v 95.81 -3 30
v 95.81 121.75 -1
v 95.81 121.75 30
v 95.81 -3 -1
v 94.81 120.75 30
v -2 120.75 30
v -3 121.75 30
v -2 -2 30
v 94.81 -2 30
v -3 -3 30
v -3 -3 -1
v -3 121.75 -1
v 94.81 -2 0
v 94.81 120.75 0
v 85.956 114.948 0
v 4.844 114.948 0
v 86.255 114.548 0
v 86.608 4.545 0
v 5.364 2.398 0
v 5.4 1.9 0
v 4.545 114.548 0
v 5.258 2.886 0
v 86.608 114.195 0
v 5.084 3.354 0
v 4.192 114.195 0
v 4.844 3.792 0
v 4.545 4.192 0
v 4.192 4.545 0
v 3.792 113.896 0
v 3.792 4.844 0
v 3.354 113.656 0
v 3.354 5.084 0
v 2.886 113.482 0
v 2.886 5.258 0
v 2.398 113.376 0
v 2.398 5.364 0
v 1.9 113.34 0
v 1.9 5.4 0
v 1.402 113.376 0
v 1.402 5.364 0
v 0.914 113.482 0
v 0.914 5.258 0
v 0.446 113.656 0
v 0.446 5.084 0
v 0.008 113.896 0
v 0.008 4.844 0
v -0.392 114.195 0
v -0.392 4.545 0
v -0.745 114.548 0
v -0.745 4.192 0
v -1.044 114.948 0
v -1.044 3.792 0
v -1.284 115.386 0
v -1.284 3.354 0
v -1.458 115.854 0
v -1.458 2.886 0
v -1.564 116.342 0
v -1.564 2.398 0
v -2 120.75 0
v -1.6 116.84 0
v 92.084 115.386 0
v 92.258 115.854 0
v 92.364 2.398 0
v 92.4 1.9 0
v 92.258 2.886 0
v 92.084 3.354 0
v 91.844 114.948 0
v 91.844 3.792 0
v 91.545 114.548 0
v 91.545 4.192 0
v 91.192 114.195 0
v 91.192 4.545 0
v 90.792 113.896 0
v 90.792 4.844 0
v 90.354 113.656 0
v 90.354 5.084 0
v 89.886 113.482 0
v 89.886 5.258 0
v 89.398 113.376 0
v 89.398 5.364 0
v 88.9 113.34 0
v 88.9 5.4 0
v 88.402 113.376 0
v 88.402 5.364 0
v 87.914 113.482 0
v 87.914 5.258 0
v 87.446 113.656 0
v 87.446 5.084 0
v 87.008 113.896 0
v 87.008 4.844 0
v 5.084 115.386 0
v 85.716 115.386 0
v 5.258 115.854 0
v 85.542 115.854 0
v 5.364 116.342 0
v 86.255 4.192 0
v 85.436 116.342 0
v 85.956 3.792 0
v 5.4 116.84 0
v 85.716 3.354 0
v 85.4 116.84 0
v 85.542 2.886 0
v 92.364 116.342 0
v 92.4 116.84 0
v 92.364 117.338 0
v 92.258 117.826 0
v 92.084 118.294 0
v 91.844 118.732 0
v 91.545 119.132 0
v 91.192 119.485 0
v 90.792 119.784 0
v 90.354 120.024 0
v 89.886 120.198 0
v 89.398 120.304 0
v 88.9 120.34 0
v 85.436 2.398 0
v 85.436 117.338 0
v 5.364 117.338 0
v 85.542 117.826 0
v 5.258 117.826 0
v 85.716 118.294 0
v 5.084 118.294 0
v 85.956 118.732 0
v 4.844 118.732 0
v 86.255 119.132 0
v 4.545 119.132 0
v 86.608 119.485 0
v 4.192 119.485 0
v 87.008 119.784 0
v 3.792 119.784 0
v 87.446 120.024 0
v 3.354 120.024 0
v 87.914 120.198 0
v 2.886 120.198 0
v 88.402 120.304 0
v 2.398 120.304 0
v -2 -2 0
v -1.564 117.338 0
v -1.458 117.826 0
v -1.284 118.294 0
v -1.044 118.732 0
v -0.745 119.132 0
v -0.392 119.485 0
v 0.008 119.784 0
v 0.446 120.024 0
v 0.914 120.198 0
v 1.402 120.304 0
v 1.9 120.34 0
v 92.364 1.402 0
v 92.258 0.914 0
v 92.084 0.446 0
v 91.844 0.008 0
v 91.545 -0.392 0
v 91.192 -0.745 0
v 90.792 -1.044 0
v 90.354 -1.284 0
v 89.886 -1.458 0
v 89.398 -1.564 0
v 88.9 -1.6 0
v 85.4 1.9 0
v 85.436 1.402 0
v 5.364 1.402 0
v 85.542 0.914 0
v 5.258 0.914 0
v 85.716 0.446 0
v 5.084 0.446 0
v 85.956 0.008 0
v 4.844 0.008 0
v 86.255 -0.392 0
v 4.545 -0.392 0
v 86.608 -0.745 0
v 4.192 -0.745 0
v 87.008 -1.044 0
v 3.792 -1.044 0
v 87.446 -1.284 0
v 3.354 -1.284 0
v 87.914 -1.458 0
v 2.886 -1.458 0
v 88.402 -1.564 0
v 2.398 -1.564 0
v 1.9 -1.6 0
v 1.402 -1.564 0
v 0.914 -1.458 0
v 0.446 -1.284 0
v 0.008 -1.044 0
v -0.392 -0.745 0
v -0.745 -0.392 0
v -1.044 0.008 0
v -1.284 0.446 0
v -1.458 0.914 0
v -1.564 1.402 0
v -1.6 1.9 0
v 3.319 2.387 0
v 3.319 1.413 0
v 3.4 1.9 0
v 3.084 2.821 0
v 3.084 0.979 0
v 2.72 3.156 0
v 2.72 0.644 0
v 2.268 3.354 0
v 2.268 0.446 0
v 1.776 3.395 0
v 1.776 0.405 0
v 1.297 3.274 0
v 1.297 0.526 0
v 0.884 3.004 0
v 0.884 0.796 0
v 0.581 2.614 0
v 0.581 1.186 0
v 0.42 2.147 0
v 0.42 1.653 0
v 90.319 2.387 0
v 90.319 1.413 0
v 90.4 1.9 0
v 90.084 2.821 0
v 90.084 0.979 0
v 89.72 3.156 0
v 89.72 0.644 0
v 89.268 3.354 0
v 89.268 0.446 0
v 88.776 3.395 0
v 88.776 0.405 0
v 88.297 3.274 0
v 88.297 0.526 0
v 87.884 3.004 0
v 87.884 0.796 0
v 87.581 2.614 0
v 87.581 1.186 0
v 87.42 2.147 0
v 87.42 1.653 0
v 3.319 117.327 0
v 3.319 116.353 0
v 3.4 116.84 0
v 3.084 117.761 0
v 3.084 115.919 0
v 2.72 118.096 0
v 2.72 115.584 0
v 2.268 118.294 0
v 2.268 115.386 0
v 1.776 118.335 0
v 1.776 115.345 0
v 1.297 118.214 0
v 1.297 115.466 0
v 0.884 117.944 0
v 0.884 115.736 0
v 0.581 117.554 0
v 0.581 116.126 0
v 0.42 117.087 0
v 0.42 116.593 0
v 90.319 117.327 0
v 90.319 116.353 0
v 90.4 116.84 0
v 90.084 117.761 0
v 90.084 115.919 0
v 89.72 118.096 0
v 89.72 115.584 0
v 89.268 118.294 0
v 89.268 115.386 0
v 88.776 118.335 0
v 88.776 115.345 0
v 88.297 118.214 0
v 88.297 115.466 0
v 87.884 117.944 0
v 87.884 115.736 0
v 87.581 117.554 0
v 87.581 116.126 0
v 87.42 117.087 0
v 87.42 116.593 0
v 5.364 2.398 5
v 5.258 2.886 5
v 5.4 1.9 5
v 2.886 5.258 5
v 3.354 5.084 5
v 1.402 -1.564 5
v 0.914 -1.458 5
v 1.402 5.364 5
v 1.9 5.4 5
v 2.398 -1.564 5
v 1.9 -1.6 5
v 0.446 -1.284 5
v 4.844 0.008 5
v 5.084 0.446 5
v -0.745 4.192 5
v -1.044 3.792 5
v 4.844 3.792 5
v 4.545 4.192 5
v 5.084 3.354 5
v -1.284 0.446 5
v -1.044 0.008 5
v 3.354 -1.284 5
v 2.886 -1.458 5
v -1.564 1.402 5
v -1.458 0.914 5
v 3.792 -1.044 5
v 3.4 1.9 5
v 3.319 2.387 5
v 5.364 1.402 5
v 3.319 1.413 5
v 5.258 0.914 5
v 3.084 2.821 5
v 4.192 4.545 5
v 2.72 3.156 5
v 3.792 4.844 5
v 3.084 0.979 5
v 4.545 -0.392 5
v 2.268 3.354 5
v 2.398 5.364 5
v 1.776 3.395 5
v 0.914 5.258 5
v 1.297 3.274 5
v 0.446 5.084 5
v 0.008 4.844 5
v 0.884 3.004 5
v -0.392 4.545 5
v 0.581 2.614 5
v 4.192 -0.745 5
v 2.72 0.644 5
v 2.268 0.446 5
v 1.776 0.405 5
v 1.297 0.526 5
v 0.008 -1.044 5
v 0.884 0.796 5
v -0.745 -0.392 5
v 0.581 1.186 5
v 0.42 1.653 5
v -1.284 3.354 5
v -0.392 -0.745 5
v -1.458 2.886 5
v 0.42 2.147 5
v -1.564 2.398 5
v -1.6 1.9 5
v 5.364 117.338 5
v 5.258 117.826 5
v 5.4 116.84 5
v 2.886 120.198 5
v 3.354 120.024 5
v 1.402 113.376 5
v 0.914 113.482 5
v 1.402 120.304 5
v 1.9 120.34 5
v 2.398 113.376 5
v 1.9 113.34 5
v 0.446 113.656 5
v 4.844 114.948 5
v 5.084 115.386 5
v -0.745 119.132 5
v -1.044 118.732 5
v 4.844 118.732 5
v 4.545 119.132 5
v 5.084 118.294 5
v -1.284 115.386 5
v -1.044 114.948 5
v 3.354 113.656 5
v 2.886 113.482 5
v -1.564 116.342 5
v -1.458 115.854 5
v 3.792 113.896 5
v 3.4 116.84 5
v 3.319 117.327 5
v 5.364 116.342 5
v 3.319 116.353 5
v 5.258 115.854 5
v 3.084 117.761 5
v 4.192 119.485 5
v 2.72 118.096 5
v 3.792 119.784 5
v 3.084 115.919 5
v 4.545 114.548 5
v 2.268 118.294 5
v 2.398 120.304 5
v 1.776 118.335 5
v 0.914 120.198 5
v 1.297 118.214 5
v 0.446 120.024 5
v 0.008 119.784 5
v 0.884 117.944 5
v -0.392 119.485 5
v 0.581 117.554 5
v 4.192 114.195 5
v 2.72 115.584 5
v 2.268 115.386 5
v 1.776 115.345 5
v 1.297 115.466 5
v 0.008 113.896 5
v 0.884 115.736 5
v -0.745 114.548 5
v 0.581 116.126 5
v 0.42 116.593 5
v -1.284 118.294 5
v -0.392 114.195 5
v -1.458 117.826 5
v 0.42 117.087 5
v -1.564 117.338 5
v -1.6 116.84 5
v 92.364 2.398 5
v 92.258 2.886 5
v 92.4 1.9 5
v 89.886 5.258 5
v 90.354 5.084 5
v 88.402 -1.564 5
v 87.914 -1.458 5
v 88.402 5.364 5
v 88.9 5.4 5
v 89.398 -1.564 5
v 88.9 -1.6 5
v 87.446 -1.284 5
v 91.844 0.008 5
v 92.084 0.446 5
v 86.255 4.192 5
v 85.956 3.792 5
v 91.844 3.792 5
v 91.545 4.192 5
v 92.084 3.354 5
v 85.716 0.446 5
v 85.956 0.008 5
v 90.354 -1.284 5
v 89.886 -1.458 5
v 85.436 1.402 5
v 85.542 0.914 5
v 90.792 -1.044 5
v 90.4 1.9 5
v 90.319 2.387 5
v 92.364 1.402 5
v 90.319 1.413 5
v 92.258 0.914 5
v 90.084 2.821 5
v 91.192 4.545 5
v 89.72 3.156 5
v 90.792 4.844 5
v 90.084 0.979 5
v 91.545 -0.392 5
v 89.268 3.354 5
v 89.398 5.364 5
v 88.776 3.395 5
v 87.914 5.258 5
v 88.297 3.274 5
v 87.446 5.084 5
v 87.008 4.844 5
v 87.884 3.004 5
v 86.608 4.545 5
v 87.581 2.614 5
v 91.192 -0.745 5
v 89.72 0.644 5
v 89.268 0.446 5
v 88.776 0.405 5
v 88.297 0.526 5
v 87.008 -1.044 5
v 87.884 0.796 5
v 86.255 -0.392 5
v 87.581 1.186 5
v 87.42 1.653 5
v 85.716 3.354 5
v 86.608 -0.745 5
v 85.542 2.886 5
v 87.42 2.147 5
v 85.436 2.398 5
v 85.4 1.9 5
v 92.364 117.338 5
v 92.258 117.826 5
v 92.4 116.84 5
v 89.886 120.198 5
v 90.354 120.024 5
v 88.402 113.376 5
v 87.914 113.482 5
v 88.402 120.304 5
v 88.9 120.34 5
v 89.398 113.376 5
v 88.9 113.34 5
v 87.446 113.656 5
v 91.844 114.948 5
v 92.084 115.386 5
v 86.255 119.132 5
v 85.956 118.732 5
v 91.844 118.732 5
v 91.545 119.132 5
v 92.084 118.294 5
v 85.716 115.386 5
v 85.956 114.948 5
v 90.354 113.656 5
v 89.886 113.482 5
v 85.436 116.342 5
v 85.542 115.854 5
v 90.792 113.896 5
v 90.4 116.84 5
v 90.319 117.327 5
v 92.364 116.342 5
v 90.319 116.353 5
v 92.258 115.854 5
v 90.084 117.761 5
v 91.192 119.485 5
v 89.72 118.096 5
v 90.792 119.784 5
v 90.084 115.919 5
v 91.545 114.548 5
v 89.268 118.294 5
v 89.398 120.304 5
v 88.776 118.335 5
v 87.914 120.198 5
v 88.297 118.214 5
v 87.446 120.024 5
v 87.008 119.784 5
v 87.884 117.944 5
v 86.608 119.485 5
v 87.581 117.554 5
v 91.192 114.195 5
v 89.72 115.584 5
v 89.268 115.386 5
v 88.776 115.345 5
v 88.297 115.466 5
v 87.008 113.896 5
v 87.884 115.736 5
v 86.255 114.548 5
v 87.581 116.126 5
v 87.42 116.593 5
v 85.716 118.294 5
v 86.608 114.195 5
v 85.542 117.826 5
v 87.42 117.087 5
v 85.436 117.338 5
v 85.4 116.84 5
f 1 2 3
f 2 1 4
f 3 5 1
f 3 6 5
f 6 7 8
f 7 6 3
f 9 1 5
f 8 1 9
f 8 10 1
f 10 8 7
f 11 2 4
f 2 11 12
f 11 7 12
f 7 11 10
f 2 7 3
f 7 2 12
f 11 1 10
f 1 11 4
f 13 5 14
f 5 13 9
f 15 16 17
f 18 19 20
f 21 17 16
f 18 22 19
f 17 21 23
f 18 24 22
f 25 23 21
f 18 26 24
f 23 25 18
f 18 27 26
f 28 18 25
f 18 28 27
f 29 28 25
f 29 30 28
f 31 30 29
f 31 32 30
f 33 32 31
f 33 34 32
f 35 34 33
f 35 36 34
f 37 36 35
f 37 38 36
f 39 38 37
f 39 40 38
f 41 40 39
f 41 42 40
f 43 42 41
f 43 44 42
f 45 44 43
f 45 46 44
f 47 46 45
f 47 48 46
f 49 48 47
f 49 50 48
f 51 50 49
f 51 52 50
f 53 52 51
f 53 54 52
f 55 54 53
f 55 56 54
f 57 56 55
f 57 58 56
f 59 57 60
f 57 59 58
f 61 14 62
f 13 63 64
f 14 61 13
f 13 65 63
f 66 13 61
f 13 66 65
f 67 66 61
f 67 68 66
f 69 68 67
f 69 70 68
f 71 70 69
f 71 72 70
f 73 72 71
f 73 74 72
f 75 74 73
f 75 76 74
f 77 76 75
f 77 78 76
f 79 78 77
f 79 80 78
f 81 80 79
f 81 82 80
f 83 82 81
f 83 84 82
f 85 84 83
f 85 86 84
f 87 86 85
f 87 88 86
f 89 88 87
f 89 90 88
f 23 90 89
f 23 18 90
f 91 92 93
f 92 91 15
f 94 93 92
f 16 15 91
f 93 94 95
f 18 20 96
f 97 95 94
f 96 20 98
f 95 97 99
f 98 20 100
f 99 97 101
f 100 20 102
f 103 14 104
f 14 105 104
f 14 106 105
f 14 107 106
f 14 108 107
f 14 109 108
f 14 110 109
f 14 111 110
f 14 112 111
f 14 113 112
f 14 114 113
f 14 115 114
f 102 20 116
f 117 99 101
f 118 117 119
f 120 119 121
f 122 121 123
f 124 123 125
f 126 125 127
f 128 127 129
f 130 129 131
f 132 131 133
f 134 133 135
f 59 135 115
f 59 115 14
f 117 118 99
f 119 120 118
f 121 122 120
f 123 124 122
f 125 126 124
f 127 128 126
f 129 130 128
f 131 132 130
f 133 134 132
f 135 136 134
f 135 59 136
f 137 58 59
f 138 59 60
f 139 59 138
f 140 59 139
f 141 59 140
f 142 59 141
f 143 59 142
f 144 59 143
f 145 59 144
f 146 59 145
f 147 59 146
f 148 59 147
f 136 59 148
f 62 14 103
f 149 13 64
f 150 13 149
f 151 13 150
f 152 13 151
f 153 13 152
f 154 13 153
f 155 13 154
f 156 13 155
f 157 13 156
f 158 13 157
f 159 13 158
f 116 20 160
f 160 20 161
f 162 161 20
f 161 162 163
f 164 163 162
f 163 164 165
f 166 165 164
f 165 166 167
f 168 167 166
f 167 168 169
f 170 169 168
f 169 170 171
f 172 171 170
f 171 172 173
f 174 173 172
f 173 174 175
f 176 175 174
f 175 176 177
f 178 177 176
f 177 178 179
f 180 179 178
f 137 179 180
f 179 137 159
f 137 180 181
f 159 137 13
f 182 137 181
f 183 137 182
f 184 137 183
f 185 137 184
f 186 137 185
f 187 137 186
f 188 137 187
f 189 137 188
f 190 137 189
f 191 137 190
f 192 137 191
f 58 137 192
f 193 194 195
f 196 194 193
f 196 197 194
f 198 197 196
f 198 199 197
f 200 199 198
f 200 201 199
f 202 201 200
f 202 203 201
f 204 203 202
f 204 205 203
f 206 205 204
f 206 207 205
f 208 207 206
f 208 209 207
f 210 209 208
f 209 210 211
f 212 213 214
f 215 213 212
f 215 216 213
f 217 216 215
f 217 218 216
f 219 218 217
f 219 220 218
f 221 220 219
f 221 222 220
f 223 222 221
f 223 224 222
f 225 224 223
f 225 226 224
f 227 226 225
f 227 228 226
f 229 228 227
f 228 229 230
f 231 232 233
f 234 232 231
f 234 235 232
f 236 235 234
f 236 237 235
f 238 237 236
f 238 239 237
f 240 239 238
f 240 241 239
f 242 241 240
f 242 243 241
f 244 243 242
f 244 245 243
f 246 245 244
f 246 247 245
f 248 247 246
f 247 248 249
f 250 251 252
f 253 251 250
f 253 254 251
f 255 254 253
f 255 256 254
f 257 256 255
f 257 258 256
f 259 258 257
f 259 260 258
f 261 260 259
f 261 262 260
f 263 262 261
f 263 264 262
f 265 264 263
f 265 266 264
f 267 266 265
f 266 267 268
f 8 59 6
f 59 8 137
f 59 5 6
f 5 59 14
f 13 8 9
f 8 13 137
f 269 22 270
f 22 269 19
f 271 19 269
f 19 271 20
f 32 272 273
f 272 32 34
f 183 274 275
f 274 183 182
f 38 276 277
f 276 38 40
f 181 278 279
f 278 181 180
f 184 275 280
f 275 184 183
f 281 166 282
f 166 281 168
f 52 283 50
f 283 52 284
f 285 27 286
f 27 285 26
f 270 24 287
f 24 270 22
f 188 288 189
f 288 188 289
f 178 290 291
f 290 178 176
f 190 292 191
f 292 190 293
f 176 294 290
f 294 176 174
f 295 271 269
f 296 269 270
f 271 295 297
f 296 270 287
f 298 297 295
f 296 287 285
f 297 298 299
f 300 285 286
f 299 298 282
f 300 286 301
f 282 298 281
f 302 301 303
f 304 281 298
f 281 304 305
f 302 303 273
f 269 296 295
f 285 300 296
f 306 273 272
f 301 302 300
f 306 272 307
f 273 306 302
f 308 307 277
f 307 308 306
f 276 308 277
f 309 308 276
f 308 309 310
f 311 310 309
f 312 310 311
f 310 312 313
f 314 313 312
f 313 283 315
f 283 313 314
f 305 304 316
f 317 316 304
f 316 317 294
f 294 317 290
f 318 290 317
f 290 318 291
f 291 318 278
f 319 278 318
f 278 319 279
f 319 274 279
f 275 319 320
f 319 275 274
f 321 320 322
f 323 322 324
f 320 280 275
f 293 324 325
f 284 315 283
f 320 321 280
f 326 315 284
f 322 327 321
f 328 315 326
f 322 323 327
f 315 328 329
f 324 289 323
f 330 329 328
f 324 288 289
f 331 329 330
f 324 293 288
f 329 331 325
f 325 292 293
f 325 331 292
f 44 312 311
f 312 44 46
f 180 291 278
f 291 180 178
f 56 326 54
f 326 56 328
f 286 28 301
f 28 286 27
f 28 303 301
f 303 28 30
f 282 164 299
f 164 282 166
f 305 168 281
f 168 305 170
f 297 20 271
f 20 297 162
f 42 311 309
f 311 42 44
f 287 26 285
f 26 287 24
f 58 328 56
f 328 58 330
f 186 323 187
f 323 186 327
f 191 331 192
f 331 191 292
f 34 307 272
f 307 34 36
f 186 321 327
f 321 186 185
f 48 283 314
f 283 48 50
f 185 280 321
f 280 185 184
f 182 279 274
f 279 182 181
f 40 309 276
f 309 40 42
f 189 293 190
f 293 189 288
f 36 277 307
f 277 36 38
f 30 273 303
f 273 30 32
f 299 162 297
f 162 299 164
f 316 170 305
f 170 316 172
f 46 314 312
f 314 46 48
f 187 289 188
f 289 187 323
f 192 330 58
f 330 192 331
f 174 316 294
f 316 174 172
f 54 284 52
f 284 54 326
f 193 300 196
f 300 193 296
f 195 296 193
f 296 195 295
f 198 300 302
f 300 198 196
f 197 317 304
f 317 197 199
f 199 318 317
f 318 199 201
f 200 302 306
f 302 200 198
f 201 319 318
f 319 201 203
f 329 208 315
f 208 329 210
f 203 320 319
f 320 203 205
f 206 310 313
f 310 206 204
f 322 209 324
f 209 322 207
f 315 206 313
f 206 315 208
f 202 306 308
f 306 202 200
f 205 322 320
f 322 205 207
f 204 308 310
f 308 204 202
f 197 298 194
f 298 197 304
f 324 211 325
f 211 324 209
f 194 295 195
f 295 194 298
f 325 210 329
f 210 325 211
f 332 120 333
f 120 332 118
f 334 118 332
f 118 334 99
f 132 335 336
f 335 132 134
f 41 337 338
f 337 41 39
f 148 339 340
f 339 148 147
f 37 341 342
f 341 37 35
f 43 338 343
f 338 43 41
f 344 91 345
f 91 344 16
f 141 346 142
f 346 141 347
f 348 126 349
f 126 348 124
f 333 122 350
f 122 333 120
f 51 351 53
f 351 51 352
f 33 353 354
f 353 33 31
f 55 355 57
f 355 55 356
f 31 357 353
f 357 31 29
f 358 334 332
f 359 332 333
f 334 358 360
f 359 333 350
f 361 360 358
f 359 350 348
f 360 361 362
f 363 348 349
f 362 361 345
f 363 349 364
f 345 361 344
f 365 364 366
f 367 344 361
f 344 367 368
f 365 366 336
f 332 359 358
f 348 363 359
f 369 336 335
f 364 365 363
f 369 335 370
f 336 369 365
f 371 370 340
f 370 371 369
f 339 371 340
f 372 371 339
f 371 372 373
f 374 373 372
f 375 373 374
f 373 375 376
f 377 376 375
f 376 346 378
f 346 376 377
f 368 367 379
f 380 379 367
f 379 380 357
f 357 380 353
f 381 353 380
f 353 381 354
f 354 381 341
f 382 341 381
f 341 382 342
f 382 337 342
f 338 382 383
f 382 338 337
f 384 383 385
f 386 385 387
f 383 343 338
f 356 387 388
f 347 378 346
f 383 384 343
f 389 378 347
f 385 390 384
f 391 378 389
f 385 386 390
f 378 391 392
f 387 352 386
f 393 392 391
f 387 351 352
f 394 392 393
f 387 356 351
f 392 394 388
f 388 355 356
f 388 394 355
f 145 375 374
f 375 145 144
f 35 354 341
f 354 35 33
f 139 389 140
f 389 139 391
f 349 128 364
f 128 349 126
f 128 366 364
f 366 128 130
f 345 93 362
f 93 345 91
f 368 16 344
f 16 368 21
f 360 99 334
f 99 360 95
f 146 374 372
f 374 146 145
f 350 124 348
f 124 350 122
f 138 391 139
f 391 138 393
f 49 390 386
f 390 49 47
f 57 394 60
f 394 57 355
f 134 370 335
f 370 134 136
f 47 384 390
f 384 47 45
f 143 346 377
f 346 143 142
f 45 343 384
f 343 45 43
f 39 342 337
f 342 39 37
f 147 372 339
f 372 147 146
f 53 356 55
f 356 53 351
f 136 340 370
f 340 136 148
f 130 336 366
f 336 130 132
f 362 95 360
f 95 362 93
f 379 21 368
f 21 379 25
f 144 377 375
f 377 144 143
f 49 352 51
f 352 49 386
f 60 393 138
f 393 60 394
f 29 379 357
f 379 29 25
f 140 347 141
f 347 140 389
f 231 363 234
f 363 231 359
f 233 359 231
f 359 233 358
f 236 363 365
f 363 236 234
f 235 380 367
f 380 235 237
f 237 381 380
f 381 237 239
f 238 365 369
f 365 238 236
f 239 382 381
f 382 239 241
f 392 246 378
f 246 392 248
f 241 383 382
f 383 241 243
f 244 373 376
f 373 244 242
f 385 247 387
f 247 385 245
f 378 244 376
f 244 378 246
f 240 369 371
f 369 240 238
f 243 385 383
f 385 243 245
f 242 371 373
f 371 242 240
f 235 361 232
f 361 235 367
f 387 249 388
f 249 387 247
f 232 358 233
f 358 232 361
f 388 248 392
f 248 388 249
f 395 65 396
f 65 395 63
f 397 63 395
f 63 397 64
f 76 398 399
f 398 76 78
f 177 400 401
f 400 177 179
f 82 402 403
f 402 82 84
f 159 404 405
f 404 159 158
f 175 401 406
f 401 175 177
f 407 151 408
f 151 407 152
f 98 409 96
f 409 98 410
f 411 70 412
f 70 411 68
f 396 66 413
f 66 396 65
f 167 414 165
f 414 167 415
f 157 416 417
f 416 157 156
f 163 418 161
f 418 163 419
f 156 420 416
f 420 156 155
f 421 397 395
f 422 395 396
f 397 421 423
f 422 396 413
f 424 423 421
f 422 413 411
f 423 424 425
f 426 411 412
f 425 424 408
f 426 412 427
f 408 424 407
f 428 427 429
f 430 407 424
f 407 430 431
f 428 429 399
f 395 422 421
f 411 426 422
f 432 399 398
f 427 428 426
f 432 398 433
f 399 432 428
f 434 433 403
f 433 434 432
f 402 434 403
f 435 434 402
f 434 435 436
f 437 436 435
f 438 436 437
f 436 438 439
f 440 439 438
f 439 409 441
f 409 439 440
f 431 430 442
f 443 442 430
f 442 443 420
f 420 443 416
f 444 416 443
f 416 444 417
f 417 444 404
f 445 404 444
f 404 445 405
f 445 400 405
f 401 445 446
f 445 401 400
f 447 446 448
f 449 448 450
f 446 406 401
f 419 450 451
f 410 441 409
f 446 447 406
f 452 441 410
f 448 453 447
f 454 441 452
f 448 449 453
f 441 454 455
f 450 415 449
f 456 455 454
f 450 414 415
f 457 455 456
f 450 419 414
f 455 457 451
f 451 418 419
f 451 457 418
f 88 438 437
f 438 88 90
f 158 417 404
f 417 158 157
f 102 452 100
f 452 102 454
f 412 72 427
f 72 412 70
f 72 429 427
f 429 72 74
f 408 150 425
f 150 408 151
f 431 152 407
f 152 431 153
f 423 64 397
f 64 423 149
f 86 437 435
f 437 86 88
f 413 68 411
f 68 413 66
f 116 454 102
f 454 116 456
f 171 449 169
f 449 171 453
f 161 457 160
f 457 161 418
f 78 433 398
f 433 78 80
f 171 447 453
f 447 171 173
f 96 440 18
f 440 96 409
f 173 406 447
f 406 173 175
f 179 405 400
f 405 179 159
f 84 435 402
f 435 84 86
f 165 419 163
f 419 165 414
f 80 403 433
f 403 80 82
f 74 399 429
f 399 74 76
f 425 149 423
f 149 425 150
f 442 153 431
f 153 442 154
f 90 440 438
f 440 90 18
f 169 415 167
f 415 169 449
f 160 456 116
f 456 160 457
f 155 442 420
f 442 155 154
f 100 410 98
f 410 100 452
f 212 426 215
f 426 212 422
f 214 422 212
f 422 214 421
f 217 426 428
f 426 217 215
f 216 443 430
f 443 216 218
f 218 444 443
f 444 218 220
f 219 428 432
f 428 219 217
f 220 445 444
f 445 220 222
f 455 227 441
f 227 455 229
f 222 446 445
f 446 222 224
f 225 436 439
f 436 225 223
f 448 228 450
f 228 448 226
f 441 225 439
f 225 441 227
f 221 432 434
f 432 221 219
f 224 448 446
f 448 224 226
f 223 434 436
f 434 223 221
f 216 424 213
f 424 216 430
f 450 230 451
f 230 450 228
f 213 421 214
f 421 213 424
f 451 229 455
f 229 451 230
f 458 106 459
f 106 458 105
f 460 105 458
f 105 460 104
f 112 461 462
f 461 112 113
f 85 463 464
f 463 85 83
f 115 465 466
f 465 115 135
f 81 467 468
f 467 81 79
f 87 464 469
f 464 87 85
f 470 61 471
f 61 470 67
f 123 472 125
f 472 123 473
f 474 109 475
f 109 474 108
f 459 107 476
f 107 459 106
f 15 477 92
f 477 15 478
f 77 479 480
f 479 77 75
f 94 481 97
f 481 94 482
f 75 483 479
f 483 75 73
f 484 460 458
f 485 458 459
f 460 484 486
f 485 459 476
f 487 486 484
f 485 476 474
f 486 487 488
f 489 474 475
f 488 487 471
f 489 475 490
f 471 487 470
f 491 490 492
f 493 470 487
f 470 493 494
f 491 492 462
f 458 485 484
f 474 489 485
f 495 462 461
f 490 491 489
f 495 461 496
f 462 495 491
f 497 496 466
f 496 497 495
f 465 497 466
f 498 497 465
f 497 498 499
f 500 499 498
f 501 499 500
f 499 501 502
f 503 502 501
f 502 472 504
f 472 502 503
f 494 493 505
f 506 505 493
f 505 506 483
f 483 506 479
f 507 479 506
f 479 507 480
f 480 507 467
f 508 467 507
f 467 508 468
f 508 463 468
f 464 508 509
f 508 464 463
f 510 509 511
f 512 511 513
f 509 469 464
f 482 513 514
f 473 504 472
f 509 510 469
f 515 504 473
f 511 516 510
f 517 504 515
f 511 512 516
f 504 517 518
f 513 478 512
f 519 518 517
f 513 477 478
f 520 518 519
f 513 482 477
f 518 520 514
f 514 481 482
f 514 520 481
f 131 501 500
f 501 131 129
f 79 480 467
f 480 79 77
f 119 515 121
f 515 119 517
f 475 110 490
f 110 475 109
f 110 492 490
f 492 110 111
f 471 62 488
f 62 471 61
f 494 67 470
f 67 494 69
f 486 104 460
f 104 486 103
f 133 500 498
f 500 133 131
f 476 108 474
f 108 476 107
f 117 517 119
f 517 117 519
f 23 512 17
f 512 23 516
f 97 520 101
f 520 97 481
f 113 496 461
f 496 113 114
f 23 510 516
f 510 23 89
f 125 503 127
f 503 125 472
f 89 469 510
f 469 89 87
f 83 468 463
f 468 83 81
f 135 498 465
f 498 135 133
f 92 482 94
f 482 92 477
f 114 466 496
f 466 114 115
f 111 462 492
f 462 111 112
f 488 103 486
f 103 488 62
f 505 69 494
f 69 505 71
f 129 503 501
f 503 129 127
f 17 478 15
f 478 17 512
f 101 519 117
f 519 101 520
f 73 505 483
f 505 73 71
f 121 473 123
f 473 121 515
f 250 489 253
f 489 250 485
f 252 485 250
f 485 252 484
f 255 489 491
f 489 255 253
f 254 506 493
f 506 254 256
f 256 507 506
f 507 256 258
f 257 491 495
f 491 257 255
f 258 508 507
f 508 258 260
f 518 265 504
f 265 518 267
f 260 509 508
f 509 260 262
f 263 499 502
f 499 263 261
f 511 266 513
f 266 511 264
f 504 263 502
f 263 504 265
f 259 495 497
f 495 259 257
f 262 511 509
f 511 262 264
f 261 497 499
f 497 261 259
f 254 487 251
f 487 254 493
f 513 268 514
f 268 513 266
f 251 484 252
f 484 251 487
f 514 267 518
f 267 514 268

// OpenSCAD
//currantly the box is unfinished, but you can still use faceplate.
$fa=1/1;
$fs=1/2;
bissl=1/100;
part="bottom";//[bottom,top,faceplate]
pegs_h=5;
pegs_id=3;
pegs_od=7;
wall=1;
depth=30;
air=0.5; //wiggle room
//board (and box) size goes here
//defined as corners of inner space relatove to x=y=0 point on the board
//[x1,y1,x2,y2]
board=[-2,-2,90.81+4,118.75+2];
screen=[67.2+2,16.5-10,20,27];
//holes in the front panel
//defined as [x,y,diameter], where x from KiCAD becomes y and y becomes x, because
//coordinate conventions in Kicad and OpenSCAD are mirrored
holes_positions=[
  [48.90,66.68,12], //encoder
  [48.3,85.4,7], //power
  [71.12,48.26,8], //leds
  [71.12,67.31,8],
  [71.12,86.36,8],
  [71.12,105.41,8],
  [85.73,48,12], //buttons
  [85.73,67.3,12],
  [85.73,86.36,12],
  [85.73,105.41,12]];
//standoffs to hold the board
//defined as [x,y,id,od,height], where x from KiCAD becomes y and y becomes x, because
//coordinate conventions in Kicad and OpenSCAD are mirrored
mount_pegs=[
  [1.90,1.90,pegs_id,pegs_od,pegs_h],
  [1.90,116.84,pegs_id,pegs_od,pegs_h],
  [88.90,1.90,pegs_id,pegs_od,pegs_h],
  [88.90,116.84,pegs_id,pegs_od,pegs_h]
];
module bottom() {
  difference() {
    translate([board[0]-wall,board[1]-wall,-wall]) cube([board[2]-board[0]+2*wall,board[3]-board[1]+2*wall,depth+wall]);
    translate([board[0],board[1],0]) cube([board[2]-board[0],board[3]-board[1],depth+bissl]);
  }
  for (peg=mount_pegs) {
    translate([peg[0],peg[1],0]) difference() {
      cylinder(d=peg[3],h=peg[4]);
      translate([0,0,-bissl]) cylinder(d=peg[2],h=peg[4]+2*bissl);
    }
  }
}
module faceplate() {
  difference() {
    translate([board[0]-wall,board[1]-wall,0]) cube([board[2]-board[0]+2*wall,board[3]-board[1]+2*wall,wall]);
    for (hole=holes_positions) {
      translate([hole[0],hole[1],-bissl]) cylinder(d=hole[2],h=wall+2*bissl);
    }
    translate([screen[0],screen[1],-bissl])cube([screen[2],screen[3],wall+2*bissl]);
  }
};
module top() {
  mirror([0,0,1])faceplate();
    difference() {
    translate([board[0]-wall,board[1]-wall,0]) cube([board[2]-board[0]+2*wall,board[3]-board[1]+2*wall,depth]);
    translate([board[0],board[1],-bissl]) cube([board[2]-board[0],board[3]-board[1],depth+2*bissl]);
  }
}
if (part=="bottom") bottom();
if (part=="faceplate") faceplate();
if (part=="top") top();
if (part=="all") {
  bottom();
  translate([0,0,depth+wall]) faceplate();
}
